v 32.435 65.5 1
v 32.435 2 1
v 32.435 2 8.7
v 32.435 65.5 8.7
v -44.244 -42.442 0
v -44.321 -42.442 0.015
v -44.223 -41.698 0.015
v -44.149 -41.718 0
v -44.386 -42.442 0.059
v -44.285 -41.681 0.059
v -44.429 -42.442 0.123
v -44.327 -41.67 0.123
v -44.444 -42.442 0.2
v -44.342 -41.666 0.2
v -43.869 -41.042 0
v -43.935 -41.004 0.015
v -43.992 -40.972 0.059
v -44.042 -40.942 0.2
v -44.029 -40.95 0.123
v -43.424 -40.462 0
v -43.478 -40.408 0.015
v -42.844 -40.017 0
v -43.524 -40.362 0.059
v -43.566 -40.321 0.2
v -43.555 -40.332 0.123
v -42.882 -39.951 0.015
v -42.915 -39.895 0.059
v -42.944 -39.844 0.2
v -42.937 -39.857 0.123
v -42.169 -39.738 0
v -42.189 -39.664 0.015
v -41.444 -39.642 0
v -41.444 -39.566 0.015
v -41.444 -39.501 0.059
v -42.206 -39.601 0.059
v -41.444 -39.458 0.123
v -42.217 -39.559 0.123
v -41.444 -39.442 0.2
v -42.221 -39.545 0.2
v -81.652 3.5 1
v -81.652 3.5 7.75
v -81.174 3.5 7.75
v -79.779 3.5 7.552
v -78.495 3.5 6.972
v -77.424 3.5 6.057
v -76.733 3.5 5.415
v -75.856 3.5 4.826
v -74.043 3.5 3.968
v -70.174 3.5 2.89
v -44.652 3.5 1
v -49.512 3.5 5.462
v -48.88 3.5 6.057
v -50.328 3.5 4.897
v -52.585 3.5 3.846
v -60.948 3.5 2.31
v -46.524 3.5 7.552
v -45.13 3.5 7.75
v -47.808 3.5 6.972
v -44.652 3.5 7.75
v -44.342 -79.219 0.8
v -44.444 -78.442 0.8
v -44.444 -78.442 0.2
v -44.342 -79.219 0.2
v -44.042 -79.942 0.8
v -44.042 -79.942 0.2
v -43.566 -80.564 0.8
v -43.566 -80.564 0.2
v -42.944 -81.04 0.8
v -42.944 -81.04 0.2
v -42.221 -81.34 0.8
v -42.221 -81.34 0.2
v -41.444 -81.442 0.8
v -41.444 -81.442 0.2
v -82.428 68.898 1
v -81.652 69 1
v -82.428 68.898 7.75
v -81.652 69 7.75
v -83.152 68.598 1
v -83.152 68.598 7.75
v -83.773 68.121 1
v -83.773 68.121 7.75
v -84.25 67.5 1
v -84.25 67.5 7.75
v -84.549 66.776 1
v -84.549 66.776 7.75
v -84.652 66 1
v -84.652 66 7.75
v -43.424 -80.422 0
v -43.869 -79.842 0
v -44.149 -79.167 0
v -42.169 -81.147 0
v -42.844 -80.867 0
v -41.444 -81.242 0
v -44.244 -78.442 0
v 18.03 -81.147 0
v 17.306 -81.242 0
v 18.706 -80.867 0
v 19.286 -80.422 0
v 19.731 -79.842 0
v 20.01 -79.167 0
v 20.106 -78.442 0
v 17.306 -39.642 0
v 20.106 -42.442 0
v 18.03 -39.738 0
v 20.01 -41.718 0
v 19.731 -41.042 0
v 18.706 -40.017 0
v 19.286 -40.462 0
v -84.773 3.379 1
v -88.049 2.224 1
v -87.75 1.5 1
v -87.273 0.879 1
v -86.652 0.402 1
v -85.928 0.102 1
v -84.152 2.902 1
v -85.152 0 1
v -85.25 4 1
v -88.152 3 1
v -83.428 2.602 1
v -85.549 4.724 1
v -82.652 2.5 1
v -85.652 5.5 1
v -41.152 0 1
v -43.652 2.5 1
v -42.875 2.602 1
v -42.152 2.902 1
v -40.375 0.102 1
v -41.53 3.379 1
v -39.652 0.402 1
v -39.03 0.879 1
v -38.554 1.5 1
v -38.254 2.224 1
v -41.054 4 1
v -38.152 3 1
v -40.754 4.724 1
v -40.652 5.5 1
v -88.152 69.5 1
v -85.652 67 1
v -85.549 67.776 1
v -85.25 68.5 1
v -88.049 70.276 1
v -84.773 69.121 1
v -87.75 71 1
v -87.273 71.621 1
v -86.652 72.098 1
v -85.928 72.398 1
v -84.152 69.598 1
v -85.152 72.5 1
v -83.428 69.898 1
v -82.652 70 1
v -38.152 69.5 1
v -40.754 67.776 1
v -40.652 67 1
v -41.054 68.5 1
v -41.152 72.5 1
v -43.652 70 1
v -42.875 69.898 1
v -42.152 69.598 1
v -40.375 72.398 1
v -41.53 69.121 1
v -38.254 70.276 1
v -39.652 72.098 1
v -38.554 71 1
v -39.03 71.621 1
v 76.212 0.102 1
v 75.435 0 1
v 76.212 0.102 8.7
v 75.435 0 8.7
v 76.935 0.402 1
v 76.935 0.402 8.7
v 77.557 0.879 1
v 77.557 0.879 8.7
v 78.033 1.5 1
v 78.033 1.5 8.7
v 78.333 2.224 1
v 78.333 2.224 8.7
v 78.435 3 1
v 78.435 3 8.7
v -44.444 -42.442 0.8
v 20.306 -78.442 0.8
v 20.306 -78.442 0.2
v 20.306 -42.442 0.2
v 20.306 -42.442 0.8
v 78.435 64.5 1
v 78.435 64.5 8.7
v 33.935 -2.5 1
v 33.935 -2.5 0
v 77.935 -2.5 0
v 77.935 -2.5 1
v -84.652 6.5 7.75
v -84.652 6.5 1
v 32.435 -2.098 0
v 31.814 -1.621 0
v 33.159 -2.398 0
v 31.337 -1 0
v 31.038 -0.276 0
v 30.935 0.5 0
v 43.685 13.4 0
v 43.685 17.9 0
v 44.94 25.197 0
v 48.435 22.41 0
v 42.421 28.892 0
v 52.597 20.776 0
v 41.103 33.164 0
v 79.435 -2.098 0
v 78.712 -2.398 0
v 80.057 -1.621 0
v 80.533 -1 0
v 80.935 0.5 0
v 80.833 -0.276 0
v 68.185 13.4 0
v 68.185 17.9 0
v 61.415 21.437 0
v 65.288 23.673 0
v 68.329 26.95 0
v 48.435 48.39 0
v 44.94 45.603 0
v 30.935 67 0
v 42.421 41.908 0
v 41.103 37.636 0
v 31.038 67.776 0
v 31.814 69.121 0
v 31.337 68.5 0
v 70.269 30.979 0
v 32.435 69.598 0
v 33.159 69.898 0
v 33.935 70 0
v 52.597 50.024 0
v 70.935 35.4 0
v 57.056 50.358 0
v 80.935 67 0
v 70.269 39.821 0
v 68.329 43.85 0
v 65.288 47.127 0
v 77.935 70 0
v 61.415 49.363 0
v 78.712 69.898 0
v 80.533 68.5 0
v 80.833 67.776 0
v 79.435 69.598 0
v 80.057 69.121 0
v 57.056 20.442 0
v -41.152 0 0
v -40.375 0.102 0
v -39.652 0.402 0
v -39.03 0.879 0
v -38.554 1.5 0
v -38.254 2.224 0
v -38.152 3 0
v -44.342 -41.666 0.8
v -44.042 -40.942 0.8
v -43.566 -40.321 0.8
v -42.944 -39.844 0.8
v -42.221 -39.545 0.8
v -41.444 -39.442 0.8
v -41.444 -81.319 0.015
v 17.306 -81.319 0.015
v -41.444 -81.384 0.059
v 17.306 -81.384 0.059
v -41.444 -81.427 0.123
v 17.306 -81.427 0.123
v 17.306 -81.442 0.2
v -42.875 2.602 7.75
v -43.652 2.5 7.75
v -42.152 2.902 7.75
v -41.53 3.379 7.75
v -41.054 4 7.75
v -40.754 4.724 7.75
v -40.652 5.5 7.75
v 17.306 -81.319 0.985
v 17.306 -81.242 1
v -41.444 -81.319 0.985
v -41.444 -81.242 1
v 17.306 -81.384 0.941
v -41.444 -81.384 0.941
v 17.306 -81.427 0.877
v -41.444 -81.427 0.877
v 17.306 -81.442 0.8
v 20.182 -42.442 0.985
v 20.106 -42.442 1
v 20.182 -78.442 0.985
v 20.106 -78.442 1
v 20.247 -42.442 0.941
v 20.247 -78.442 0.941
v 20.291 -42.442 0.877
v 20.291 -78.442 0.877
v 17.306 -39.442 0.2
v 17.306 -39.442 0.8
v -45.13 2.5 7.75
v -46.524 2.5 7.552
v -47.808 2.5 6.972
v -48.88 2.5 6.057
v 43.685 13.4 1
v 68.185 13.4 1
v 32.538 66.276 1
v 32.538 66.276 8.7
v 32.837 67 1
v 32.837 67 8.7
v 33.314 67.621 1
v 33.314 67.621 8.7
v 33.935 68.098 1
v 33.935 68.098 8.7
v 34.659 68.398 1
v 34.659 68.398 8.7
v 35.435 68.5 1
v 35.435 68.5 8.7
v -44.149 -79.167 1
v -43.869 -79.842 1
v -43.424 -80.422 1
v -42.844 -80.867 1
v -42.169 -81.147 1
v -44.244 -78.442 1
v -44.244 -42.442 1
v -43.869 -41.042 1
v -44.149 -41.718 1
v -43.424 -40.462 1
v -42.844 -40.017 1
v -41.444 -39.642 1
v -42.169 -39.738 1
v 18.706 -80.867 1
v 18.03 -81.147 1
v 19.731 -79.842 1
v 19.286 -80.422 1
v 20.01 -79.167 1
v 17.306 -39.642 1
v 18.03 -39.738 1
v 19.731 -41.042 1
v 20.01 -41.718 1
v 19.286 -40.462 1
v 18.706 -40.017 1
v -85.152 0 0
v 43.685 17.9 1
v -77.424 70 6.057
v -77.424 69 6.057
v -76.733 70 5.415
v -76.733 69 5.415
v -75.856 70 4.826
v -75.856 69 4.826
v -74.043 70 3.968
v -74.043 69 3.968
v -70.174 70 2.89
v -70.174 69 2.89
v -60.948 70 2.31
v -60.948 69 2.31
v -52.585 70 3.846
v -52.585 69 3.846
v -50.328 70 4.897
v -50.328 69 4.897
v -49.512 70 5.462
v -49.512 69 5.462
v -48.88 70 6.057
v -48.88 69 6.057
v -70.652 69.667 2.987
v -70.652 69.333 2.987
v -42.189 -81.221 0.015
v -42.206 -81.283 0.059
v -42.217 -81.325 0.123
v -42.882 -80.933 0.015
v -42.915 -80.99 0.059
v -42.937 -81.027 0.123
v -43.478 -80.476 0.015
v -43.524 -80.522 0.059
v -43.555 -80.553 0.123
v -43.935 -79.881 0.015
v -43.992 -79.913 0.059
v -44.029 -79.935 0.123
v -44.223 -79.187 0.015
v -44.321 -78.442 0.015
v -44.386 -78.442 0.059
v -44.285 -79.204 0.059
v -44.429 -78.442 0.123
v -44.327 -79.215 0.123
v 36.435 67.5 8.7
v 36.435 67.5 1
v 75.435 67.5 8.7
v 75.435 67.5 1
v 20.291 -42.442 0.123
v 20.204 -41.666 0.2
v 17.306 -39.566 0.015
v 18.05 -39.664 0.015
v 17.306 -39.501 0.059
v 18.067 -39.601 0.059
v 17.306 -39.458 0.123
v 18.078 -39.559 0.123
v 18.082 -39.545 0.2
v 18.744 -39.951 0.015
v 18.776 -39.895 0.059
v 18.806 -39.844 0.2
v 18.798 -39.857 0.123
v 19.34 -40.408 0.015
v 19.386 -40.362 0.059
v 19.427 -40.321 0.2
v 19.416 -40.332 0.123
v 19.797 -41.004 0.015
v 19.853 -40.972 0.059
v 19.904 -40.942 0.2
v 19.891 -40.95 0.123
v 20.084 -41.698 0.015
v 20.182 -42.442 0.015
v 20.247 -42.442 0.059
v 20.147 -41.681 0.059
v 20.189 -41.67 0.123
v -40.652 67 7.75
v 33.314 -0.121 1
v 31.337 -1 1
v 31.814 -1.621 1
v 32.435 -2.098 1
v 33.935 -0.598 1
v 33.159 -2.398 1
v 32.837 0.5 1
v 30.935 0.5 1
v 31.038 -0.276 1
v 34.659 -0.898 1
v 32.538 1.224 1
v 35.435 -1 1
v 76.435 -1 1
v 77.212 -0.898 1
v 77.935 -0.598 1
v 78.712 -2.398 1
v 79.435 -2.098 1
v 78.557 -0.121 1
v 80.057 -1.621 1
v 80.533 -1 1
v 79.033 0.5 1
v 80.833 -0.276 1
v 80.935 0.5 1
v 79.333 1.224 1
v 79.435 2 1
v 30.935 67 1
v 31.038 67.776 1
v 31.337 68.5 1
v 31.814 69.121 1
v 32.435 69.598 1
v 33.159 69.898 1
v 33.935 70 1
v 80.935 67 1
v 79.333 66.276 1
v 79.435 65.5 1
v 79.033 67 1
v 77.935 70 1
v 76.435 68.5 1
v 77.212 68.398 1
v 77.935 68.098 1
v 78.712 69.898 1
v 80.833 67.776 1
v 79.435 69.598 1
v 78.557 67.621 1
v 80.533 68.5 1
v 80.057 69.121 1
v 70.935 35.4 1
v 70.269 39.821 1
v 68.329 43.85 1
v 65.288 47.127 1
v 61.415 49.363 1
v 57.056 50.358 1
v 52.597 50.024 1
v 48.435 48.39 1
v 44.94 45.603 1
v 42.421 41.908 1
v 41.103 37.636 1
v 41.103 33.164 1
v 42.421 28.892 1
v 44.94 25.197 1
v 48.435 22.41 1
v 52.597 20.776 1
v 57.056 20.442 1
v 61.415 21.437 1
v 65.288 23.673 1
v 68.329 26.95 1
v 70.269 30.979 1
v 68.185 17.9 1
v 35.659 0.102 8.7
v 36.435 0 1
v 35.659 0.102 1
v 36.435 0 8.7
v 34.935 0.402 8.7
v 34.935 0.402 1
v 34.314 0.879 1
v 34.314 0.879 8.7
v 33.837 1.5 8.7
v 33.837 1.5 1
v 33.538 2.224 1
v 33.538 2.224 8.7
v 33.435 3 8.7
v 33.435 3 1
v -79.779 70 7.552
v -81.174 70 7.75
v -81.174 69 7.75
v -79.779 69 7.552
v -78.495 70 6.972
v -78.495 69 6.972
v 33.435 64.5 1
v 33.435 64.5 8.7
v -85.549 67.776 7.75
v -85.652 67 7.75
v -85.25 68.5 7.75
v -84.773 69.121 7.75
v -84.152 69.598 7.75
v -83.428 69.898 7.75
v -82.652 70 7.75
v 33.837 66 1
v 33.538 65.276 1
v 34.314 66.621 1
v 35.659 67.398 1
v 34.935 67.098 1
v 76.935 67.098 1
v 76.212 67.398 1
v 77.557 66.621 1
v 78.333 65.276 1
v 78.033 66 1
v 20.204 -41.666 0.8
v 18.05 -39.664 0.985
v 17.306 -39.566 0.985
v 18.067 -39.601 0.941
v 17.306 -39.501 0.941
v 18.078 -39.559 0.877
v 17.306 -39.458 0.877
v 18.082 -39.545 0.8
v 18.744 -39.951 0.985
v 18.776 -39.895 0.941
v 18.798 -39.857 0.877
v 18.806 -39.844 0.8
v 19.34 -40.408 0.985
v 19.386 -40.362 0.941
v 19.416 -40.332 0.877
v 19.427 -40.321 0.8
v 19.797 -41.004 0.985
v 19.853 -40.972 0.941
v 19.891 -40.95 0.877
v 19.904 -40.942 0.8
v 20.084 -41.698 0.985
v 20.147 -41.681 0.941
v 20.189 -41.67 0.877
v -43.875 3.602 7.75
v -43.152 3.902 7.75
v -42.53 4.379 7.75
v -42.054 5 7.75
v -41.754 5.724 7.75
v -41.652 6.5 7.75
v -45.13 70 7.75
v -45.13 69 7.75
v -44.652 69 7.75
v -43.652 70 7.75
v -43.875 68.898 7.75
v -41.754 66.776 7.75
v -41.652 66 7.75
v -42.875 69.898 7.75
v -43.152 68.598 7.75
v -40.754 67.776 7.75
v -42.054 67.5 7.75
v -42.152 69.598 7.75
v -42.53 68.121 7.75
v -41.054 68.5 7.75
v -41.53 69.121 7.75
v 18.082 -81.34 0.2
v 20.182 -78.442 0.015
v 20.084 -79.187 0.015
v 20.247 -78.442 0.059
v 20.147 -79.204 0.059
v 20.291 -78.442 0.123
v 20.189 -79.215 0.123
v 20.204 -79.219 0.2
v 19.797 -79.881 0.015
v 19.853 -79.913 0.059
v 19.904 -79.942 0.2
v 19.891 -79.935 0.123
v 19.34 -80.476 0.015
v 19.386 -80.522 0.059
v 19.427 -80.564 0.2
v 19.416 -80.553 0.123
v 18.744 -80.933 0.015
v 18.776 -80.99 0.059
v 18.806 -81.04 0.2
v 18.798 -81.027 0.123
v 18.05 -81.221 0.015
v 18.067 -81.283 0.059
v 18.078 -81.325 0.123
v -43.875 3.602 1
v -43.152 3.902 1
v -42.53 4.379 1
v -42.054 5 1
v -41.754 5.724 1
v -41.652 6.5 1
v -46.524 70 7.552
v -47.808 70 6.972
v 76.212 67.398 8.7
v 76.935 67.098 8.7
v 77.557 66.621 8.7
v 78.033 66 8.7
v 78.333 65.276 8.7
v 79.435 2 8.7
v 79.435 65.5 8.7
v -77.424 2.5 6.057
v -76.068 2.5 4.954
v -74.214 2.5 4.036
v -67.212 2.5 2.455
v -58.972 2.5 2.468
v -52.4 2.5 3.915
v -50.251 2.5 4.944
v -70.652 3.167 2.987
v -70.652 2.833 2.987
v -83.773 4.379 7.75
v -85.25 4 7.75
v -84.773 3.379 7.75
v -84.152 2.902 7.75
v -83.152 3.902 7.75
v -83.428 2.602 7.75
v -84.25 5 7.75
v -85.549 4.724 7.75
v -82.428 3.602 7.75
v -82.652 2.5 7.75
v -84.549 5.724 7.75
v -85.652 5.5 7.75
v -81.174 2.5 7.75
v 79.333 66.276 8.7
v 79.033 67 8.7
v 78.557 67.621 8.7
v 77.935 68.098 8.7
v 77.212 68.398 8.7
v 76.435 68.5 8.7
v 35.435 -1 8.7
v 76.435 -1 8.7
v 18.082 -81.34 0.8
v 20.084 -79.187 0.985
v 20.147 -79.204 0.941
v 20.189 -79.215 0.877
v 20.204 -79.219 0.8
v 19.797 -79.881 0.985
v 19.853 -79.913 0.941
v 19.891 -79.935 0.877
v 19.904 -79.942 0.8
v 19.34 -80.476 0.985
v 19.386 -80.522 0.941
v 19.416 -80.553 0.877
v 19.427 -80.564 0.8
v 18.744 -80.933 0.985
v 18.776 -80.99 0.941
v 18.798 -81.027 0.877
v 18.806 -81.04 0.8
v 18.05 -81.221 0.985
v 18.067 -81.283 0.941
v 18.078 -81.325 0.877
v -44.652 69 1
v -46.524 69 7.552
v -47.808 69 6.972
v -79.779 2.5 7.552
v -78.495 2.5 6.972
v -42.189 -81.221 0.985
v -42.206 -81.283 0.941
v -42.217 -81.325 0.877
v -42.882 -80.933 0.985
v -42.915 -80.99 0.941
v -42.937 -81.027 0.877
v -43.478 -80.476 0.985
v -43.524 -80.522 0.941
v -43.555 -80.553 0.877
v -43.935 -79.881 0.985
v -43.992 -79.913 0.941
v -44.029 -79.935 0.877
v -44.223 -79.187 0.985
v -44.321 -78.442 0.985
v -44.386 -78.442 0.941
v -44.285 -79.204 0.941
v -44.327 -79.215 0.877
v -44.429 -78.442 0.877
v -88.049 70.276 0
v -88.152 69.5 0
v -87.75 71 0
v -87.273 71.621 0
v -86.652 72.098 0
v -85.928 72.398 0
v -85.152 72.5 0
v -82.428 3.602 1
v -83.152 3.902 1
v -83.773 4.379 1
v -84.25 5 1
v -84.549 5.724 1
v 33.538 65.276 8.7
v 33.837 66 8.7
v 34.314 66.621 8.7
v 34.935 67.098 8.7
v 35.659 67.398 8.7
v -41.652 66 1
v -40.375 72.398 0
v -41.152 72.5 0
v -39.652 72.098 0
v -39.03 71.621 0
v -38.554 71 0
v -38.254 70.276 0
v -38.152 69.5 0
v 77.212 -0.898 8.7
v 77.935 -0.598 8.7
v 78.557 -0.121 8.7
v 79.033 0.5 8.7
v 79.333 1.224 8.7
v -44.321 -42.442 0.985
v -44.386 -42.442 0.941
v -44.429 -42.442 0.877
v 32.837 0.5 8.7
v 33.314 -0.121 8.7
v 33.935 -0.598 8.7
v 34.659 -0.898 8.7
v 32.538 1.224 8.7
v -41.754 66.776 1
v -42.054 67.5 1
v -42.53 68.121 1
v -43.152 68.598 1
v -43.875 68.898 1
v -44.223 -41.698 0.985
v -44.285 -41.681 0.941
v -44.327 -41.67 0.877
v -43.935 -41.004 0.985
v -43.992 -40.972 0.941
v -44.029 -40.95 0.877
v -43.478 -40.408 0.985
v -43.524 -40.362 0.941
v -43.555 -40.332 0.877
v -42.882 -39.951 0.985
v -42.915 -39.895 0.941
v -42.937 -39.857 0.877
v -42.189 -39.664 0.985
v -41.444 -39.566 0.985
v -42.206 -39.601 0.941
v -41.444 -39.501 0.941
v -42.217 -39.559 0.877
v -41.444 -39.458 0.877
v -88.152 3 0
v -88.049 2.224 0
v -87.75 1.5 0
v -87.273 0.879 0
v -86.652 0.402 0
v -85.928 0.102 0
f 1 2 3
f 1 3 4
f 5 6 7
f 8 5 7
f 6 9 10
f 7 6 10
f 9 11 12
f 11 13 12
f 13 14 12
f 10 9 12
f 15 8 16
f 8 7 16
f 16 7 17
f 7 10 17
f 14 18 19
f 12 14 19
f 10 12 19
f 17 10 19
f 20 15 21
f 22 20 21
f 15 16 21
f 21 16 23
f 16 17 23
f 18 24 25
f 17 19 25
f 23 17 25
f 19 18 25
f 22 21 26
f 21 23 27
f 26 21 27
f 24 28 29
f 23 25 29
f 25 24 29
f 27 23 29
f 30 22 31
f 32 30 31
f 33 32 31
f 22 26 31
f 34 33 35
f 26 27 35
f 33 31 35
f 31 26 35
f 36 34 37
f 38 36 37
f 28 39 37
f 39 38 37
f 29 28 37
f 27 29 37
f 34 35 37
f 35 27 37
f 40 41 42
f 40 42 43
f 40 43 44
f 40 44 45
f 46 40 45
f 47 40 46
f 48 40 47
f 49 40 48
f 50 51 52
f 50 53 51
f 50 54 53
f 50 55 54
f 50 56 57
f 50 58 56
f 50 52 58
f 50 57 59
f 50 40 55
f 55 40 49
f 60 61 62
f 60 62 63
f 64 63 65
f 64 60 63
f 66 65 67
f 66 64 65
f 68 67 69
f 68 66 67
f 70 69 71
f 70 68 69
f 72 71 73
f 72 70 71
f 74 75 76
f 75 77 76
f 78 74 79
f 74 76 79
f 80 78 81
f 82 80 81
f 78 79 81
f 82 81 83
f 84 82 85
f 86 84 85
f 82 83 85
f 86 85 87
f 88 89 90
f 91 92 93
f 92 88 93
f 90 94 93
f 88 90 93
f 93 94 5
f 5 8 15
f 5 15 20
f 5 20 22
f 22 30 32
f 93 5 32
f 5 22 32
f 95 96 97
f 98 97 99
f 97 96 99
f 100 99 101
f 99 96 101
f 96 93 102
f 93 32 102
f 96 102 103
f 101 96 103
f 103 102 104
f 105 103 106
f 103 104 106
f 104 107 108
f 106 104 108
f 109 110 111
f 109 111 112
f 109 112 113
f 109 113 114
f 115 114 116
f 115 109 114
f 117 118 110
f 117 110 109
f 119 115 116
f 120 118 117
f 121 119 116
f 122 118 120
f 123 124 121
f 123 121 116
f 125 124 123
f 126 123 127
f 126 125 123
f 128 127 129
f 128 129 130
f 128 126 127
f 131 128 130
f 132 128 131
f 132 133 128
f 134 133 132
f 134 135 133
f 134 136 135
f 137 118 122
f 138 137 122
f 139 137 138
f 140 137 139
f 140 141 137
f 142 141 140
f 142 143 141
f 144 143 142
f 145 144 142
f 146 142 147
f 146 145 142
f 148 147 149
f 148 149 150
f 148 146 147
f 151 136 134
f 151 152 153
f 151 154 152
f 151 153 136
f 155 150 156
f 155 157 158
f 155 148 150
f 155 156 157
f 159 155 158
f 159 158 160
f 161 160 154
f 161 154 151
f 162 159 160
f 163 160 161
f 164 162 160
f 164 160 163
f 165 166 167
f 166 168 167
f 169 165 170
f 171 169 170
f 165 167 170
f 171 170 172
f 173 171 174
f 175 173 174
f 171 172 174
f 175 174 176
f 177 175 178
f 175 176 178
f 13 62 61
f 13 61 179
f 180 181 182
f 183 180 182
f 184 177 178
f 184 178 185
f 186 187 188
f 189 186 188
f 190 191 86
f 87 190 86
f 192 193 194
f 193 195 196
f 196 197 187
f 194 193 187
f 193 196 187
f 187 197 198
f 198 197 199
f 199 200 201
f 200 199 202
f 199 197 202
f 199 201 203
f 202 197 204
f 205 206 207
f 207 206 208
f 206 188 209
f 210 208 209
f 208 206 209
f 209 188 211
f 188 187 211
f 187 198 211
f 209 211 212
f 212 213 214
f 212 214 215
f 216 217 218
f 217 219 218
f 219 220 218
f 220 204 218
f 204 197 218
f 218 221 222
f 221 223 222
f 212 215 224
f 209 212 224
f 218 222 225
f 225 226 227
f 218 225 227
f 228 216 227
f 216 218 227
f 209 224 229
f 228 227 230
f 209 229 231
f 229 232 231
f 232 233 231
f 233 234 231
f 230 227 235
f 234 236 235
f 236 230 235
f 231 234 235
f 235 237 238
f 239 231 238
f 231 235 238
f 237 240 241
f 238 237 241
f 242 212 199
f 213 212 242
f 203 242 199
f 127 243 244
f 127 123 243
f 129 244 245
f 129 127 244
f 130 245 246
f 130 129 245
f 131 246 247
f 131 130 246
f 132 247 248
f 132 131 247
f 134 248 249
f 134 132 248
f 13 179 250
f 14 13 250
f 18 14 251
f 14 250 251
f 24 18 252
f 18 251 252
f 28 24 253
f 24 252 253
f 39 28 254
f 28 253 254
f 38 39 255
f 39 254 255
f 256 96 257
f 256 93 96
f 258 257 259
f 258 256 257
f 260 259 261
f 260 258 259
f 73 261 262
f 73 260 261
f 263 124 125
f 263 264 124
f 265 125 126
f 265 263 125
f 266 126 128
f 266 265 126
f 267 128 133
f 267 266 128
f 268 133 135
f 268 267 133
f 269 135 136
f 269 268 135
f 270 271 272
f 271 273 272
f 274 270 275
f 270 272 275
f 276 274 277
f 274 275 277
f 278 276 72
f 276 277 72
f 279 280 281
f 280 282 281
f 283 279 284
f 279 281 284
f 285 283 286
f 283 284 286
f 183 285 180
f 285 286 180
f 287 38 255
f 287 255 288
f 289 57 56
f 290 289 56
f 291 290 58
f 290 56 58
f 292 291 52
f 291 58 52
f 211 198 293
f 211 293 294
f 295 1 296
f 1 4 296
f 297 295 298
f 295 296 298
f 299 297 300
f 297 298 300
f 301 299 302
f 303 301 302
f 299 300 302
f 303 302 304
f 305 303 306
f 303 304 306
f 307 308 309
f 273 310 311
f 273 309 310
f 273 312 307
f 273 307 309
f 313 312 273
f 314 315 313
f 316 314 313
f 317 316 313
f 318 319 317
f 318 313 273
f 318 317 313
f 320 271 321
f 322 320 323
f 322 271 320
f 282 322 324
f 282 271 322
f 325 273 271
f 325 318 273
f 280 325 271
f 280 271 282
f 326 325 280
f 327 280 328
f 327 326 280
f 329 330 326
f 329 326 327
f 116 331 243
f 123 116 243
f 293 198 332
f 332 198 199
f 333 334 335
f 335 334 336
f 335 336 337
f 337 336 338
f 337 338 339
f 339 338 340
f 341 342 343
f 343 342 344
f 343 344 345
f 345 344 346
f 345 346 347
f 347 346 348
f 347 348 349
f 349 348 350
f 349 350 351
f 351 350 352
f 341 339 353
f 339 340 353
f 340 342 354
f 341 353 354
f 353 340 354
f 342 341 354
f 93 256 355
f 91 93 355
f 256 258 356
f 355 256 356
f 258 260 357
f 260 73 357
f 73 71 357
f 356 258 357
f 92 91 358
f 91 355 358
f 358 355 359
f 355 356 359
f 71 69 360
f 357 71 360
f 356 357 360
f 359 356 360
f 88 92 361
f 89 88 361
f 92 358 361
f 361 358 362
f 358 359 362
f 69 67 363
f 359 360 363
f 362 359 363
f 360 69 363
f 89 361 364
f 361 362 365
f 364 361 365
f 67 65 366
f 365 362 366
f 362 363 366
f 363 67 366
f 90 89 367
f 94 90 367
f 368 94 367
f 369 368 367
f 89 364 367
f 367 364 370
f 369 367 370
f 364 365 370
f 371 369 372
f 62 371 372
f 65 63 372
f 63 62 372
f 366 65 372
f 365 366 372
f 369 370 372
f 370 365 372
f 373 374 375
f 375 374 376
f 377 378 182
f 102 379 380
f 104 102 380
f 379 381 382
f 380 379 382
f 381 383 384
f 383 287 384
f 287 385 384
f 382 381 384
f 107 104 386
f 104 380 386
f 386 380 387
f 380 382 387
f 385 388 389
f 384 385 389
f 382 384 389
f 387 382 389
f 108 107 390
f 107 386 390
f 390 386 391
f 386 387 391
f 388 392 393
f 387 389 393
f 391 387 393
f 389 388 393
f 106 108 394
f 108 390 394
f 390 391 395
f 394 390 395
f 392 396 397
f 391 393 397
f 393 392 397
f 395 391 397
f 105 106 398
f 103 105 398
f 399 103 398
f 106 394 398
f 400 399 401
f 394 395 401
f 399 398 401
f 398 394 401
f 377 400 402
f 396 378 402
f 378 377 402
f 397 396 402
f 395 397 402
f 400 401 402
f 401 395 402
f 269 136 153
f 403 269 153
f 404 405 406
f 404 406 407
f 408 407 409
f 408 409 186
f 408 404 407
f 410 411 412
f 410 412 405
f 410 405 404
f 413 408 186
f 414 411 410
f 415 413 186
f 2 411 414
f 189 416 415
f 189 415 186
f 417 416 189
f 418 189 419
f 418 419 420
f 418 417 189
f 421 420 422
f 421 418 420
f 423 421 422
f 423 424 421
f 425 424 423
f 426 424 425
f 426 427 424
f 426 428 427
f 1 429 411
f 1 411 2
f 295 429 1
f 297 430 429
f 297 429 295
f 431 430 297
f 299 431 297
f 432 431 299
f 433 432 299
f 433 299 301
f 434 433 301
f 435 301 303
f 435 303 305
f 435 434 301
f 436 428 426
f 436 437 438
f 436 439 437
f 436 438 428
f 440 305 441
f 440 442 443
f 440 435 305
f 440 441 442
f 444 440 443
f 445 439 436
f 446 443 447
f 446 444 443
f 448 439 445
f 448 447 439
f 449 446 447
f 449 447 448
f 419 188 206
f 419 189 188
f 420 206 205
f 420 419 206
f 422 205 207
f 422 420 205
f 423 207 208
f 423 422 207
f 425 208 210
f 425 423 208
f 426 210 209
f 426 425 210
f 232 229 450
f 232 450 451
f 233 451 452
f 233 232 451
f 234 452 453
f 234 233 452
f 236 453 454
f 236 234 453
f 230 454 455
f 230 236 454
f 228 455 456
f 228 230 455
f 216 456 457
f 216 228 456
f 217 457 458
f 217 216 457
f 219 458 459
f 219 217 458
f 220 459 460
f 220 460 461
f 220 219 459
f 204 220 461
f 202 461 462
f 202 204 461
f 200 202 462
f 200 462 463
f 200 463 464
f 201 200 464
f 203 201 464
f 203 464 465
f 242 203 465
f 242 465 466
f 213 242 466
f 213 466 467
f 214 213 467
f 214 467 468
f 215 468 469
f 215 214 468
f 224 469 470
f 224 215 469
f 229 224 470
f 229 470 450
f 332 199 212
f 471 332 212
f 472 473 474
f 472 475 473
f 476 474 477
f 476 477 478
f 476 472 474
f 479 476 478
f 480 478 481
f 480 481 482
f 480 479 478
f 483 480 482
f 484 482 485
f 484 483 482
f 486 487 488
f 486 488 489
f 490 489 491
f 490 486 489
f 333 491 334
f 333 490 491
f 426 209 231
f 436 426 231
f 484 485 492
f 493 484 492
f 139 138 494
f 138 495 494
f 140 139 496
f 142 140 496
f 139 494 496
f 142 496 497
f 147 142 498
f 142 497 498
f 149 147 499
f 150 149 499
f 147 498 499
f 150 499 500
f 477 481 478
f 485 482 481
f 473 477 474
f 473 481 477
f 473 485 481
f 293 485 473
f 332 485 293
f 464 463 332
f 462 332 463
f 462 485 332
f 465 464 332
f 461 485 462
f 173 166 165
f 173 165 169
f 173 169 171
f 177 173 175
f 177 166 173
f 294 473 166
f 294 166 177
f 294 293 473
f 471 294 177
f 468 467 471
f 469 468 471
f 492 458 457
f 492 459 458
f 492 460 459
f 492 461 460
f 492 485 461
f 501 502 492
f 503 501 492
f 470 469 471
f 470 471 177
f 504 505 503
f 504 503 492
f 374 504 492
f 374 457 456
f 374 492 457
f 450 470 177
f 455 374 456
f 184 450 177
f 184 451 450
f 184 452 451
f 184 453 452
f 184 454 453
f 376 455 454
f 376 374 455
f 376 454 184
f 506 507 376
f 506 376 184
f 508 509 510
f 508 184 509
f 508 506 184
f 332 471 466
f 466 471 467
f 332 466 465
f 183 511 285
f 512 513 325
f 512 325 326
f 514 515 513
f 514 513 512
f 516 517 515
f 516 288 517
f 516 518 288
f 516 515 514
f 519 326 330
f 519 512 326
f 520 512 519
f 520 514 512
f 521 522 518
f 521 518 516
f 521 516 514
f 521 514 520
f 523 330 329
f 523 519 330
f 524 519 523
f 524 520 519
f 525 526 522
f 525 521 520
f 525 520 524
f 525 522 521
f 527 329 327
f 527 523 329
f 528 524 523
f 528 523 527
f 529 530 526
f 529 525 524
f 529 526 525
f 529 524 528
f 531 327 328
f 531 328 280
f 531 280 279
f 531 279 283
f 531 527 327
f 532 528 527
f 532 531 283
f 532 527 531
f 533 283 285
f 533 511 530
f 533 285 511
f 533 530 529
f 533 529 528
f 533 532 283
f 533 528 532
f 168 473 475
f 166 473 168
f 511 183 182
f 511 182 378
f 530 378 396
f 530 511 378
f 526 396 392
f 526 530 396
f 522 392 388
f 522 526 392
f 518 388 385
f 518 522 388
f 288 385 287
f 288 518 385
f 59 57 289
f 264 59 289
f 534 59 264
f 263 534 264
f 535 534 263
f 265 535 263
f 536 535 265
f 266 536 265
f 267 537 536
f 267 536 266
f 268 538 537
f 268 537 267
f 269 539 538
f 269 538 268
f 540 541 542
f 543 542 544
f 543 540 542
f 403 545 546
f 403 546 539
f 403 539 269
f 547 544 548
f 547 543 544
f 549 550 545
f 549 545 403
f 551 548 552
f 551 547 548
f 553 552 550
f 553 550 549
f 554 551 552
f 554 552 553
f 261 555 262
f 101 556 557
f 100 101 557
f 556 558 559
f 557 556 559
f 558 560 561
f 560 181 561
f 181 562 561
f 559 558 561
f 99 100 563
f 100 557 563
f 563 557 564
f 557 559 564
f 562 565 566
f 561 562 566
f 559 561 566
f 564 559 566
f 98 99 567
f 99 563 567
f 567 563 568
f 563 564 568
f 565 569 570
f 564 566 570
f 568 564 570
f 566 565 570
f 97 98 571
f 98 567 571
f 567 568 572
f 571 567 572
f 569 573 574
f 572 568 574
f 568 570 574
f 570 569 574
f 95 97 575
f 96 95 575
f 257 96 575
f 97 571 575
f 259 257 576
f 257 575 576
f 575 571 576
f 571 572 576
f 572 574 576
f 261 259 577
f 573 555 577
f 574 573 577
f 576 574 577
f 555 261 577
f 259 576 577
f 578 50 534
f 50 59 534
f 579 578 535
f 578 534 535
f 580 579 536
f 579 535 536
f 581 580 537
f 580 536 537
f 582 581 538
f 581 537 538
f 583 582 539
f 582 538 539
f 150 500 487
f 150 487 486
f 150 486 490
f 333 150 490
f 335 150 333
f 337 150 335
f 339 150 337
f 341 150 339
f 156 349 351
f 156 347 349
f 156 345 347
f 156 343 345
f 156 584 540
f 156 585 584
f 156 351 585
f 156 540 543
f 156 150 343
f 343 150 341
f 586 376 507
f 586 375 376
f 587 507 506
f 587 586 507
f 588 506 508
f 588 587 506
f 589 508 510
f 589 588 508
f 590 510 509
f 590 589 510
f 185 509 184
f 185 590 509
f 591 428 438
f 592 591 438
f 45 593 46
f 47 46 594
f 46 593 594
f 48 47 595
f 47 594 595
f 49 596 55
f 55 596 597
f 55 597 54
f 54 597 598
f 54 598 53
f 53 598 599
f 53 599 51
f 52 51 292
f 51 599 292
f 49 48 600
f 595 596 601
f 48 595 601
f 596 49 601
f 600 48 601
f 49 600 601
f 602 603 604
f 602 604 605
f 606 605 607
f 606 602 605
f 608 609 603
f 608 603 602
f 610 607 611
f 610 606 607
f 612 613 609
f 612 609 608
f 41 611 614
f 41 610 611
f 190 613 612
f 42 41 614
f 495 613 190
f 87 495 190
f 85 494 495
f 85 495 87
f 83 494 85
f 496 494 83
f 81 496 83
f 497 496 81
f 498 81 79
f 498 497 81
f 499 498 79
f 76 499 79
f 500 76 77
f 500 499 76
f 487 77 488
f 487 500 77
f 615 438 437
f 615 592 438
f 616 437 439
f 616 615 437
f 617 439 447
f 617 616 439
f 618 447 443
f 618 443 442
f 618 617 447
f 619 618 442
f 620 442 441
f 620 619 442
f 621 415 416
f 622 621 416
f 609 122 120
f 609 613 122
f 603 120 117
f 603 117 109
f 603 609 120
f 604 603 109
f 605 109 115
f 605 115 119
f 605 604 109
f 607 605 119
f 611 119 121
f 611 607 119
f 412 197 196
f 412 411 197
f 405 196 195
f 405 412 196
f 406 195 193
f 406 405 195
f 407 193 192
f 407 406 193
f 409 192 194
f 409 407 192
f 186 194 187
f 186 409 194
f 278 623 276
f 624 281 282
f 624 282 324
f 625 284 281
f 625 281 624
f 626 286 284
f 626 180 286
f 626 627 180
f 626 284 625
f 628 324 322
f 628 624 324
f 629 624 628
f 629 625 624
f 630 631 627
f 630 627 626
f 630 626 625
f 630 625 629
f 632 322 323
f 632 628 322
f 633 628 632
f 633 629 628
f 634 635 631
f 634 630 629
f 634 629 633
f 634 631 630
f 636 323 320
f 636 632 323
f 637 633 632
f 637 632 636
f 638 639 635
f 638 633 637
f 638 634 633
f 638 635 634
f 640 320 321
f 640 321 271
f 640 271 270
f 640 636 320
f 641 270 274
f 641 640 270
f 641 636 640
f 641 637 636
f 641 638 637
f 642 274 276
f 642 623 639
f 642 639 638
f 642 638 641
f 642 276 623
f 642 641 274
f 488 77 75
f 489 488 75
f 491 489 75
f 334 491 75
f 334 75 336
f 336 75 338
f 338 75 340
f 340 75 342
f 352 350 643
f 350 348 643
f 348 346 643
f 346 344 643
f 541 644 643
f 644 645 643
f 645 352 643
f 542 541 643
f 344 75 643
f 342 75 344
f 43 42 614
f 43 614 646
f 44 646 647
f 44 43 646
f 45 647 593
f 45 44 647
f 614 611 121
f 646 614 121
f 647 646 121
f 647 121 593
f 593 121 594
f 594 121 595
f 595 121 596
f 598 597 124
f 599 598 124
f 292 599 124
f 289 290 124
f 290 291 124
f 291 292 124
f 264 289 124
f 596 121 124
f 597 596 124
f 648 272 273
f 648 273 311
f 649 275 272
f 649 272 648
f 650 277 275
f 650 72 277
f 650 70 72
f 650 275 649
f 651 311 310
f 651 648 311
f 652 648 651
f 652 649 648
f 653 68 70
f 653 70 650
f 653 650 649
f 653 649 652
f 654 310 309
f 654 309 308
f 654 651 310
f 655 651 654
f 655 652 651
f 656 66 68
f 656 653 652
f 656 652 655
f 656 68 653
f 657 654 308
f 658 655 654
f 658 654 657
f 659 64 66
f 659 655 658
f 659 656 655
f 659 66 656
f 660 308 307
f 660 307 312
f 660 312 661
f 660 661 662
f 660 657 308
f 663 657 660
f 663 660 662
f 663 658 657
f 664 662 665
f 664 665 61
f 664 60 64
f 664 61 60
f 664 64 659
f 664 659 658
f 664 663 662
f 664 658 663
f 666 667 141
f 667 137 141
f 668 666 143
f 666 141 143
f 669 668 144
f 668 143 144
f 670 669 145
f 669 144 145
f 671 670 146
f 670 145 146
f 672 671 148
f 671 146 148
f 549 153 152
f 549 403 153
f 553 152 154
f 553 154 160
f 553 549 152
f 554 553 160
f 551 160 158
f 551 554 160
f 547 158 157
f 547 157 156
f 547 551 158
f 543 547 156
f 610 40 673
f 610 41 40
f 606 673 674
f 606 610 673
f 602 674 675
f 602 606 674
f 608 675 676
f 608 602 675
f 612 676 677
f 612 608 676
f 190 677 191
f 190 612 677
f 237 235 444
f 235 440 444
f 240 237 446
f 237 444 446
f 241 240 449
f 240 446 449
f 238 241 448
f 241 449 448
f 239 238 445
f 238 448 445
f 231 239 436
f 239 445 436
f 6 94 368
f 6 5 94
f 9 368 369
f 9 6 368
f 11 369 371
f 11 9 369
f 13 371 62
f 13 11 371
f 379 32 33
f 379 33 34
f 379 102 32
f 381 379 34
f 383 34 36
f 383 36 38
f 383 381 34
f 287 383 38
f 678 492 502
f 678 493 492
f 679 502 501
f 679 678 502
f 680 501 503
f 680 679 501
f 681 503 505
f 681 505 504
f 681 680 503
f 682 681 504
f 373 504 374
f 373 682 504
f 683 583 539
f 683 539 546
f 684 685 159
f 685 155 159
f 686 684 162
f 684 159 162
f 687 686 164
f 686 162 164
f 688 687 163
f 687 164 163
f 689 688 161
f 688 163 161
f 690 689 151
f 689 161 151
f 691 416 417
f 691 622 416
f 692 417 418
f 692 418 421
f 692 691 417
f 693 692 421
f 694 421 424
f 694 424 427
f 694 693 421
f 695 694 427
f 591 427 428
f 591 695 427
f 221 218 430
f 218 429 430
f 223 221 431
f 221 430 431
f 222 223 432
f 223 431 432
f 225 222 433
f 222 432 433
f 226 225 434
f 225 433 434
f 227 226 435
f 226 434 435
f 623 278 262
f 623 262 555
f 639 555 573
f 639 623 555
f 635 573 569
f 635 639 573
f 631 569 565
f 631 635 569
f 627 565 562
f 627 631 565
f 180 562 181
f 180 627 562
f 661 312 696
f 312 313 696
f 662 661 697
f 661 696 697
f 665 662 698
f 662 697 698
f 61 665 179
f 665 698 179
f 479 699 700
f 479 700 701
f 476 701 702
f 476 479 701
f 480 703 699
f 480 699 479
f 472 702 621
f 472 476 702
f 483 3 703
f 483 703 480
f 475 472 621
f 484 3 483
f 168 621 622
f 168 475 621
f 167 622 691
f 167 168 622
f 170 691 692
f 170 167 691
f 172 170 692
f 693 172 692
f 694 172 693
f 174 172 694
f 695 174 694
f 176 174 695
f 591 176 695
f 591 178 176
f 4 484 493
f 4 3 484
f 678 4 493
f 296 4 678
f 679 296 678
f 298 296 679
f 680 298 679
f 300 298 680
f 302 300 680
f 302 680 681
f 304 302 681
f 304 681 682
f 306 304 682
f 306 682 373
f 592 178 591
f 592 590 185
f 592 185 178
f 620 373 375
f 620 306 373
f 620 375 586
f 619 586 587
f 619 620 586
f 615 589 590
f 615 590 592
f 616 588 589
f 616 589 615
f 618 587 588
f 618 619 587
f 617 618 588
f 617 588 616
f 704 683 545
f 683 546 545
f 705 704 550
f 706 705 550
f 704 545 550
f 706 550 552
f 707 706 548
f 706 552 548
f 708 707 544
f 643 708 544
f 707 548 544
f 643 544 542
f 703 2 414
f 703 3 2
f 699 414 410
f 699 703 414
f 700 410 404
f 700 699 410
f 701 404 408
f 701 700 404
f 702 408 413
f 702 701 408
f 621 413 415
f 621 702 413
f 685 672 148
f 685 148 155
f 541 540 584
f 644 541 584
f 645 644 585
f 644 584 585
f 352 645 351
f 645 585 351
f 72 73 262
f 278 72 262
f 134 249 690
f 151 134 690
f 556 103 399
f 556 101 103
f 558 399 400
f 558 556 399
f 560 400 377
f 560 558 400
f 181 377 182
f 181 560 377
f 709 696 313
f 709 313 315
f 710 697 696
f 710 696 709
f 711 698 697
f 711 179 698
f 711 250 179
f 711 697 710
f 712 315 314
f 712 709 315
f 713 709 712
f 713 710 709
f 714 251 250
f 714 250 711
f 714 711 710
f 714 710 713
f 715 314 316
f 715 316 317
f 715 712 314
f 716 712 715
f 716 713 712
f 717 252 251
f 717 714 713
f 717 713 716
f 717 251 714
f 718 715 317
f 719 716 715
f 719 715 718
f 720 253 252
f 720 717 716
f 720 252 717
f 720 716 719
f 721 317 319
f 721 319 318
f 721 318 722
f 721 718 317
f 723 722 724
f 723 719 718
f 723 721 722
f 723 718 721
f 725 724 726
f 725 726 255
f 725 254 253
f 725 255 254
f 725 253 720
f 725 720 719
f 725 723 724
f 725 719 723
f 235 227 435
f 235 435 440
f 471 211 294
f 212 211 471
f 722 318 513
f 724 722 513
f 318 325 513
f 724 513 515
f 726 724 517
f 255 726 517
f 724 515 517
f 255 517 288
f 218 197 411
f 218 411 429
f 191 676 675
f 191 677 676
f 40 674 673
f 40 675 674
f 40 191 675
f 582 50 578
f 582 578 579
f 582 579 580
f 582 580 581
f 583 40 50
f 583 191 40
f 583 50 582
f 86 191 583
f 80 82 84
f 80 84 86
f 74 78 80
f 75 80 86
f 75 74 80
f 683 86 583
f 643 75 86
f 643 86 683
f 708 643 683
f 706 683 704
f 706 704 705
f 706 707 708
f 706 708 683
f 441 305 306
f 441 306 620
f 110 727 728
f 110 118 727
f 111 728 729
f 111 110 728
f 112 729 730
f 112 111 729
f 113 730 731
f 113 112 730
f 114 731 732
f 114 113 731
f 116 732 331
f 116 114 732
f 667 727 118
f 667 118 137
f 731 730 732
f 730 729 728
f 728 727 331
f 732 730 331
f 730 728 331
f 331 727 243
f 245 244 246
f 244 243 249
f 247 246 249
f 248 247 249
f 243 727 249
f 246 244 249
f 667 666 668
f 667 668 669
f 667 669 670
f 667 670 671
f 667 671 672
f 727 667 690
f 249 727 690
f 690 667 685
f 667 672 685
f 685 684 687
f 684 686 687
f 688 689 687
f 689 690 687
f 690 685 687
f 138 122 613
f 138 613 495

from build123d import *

# Parameters (mm, degrees)
F0_W        = 64.75
F0_H        = 42
F1_DEPTH    = 1
F2_R        = 3
F3_R        = 0.2
F0_W_2      = 50
F0_H_2      = 72.5
F0_W_3      = 45
F0_H_3      = 67.5
F0_W_4      = 43
F0_H_4      = 65.5
F4_DEPTH    = 1
F5_DEPTH    = 7.75
F6_R        = 3
F8_DEPTH    = 70.001
F9_T1_DEPTH = 1
F9_T3_DEPTH = 1
F0_W_5      = 47
F0_H_5      = 69.5
F0_W_6      = 24.5
F0_H_6      = 4.5
F0_R        = 15
F10_DEPTH   = 1
F11_DEPTH   = 8.7
F12_R       = 3


# Not quite as in the source:
# - a fillet or chamfer that OpenCascade refuses, or shapes differently, is made with other operations: its cross-section is extruded or revolved along the edge and cut away or added


with BuildPart() as f1:
    # F0 (on Top) → F1 (new body)
    with BuildSketch(Plane.XY):
        with Locations((-12.0692265069, -60.4423025408)):
            Rectangle(F0_W, F0_H)
    extrude(amount=F1_DEPTH)

    # F2
    f2_edges = [f1.edges().sort_by_distance(p)[0] for p in [
        (-44.444227, -39.442303, 0.5),
        (-44.444227, -81.442303, 0.5),
        (20.305773, -81.442303, 0.5),
        (20.305773, -39.442303, 0.5),
    ]]
    fillet(f2_edges, radius=F2_R)

    # F3
    f3_edges = [f1.edges().sort_by_distance(p)[0] for p in [
        (-12.069227, -39.442303, 1),
        (19.427094, -40.320982, 1),
        (-43.565547, -40.320982, 1),
        (20.305773, -60.442303, 1),
        (-44.444227, -60.442303, 1),
        (19.427094, -80.563623, 1),
        (-43.565547, -80.563623, 1),
        (-12.069227, -81.442303, 1),
        (-12.069227, -39.442303, 0),
        (19.427094, -40.320982, 0),
        (-43.565547, -40.320982, 0),
        (20.305773, -60.442303, 0),
        (-44.444227, -60.442303, 0),
        (19.427094, -80.563623, 0),
        (-43.565547, -80.563623, 0),
        (-12.069227, -81.442303, 0),
    ]]
    fillet(f3_edges, radius=F3_R)


with BuildPart() as f4:
    # F0 (on Top) → F4 (new body)
    with BuildSketch(Plane.XY):
        with Locations((-63.1516585421, 36.25)):
            Rectangle(F0_W_2, F0_H_2)
        with Locations((-63.1516585421, 36.25)):
            Rectangle(F0_W_3, F0_H_3, mode=Mode.SUBTRACT)
        with Locations((-63.1516585421, 36.25)):
            Rectangle(F0_W_3, F0_H_3)
        with Locations((-63.1516585421, 36.25)):
            Rectangle(F0_W_4, F0_H_4, mode=Mode.SUBTRACT)
        with Locations((-63.1516585421, 36.25)):
            Rectangle(F0_W_4, F0_H_4)
    extrude(amount=F4_DEPTH)

    # F0 (on Top) → F5 (join)
    with BuildSketch(Plane.XY):
        with Locations((-63.1516585421, 36.25)):
            Rectangle(F0_W_3, F0_H_3)
        with Locations((-63.1516585421, 36.25)):
            Rectangle(F0_W_4, F0_H_4, mode=Mode.SUBTRACT)
    extrude(amount=F5_DEPTH)

    # F6
    f6_edges = [f4.edges().sort_by_distance(p)[0] for p in [
        (-85.651659, 2.5, 4.375),
        (-40.651659, 2.5, 4.375),
        (-85.651659, 70, 4.375),
        (-40.651659, 70, 4.375),
        (-88.151659, 72.5, 0.5),
        (-38.151659, 72.5, 0.5),
        (-38.151659, 0, 0.5),
        (-88.151659, 0, 0.5),
        (-41.651659, 3.5, 4.375),
        (-84.651659, 3.5, 4.375),
        (-84.651659, 69, 4.375),
        (-41.651659, 69, 4.375),
    ]]
    fillet(f6_edges, radius=F6_R)

    # F7 (on face) → F8 (cut, through all)
    with BuildSketch(Plane.XZ.offset(-2.5)):
        with BuildLine():
            add(Edge.make_bspline(
                [(-48.1516585421, 7.75), (-48.1516585421, 17.2762794416), (-70.6516585421, 12.5131397208), (-93.1516585421, 7.75), (-70.6516585421, 2.9868602792), (-48.1516585421, -1.7762794416), (-48.1516585421, 7.75)],
                knots=[0, 0, 0, 2.0943951024, 2.0943951024, 4.1887902048, 4.1887902048, 6.2831853072, 6.2831853072, 6.2831853072], degree=2, weights=[1, 0.5, 1, 0.5, 1, 0.5, 1]))
        make_face()
    extrude(amount=-F8_DEPTH, mode=Mode.SUBTRACT)

    # F9: fillet of radius 5 on 4 edges, made by hand

    # F9_s2 → F9_t1 (cut)
    with BuildSketch(Plane.XZ.offset(-70)):
        with BuildLine():
            ThreePointArc((-81.1735034535, 7.75), (-79.116499703, 7.3072728216), (-77.423772539, 6.057494228))
            Line((-77.423772539, 6.057494228), (-77.3487779207, 6.1236441126))
            ThreePointArc((-77.3487779207, 6.1236441126), (-77.8507909347, 6.8746512138), (-78.0516585421, 7.75))
            Line((-78.0516585421, 7.75), (-78.1516585421, 7.85))
            Line((-78.1516585421, 7.85), (-81.1735034535, 7.85))
            Line((-81.1735034535, 7.85), (-81.1735034535, 7.75))
        make_face()
        with BuildLine():
            ThreePointArc((-45.1298136307, 7.75), (-47.1868173813, 7.3072728216), (-48.8795445453, 6.057494228))
            Line((-48.8795445453, 6.057494228), (-48.9545391636, 6.1236441126))
            ThreePointArc((-48.9545391636, 6.1236441126), (-48.4525261496, 6.8746512138), (-48.2516585421, 7.75))
            Line((-48.2516585421, 7.75), (-48.1516585421, 7.85))
            Line((-48.1516585421, 7.85), (-45.1298136307, 7.85))
            Line((-45.1298136307, 7.85), (-45.1298136307, 7.75))
        make_face()
    extrude(amount=F9_T1_DEPTH, mode=Mode.SUBTRACT)

    # F9_s4 → F9_t3 (cut)
    with BuildSketch(Plane.XZ.offset(-3.5)):
        with BuildLine():
            ThreePointArc((-81.1735034535, 7.75), (-79.116499703, 7.3072728216), (-77.423772539, 6.057494228))
            Line((-77.423772539, 6.057494228), (-77.3487779207, 6.1236441126))
            ThreePointArc((-77.3487779207, 6.1236441126), (-77.8507909347, 6.8746512138), (-78.0516585421, 7.75))
            Line((-78.0516585421, 7.75), (-78.1516585421, 7.85))
            Line((-78.1516585421, 7.85), (-81.1735034535, 7.85))
            Line((-81.1735034535, 7.85), (-81.1735034535, 7.75))
        make_face()
        with BuildLine():
            ThreePointArc((-45.1298136307, 7.75), (-47.1868173813, 7.3072728216), (-48.8795445453, 6.057494228))
            Line((-48.8795445453, 6.057494228), (-48.9545391636, 6.1236441126))
            ThreePointArc((-48.9545391636, 6.1236441126), (-48.4525261496, 6.8746512138), (-48.2516585421, 7.75))
            Line((-48.2516585421, 7.75), (-48.1516585421, 7.85))
            Line((-48.1516585421, 7.85), (-45.1298136307, 7.85))
            Line((-45.1298136307, 7.85), (-45.1298136307, 7.75))
        make_face()
    extrude(amount=F9_T3_DEPTH, mode=Mode.SUBTRACT)


with BuildPart() as f10:
    # F0 (on Top) → F10 (new body)
    with BuildSketch(Plane.XY):
        with Locations((55.9352879792, 33.75)):
            Rectangle(F0_W_2, F0_H_2)
        with Locations((55.9352879792, 33.75)):
            Rectangle(F0_W_5, F0_H_5, mode=Mode.SUBTRACT)
        with Locations((55.9352879792, 33.75)):
            Rectangle(F0_W_5, F0_H_5)
        with Locations((55.9352879792, 33.75)):
            Rectangle(F0_W_3, F0_H_3, mode=Mode.SUBTRACT)
        with Locations((55.9352879792, 33.75)):
            Rectangle(F0_W_3, F0_H_3)
        with Locations((55.9352879792, 15.65)):
            Rectangle(F0_W_6, F0_H_6, mode=Mode.SUBTRACT)
        with Locations((55.9352879792, 35.4)):
            Circle(F0_R, mode=Mode.SUBTRACT)
    extrude(amount=F10_DEPTH)

    # F0 (on Top) → F11 (join)
    with BuildSketch(Plane.XY):
        with Locations((55.9352879792, 33.75)):
            Rectangle(F0_W_5, F0_H_5)
        with Locations((55.9352879792, 33.75)):
            Rectangle(F0_W_3, F0_H_3, mode=Mode.SUBTRACT)
    extrude(amount=F11_DEPTH)

    # F12
    f12_edges = [f10.edges().sort_by_distance(p)[0] for p in [
        (80.935288, -2.5, 0.5),
        (79.435288, -1, 4.85),
        (78.435288, 0, 4.85),
        (30.935288, -2.5, 0.5),
        (32.435288, -1, 4.85),
        (33.435288, 0, 4.85),
        (33.435288, 67.5, 4.85),
        (78.435288, 67.5, 4.85),
        (32.435288, 68.5, 4.85),
        (30.935288, 70, 0.5),
        (80.935288, 70, 0.5),
        (79.435288, 68.5, 4.85),
    ]]
    fillet(f12_edges, radius=F12_R)


solid = Compound([f1.part, f4.part, f10.part])
